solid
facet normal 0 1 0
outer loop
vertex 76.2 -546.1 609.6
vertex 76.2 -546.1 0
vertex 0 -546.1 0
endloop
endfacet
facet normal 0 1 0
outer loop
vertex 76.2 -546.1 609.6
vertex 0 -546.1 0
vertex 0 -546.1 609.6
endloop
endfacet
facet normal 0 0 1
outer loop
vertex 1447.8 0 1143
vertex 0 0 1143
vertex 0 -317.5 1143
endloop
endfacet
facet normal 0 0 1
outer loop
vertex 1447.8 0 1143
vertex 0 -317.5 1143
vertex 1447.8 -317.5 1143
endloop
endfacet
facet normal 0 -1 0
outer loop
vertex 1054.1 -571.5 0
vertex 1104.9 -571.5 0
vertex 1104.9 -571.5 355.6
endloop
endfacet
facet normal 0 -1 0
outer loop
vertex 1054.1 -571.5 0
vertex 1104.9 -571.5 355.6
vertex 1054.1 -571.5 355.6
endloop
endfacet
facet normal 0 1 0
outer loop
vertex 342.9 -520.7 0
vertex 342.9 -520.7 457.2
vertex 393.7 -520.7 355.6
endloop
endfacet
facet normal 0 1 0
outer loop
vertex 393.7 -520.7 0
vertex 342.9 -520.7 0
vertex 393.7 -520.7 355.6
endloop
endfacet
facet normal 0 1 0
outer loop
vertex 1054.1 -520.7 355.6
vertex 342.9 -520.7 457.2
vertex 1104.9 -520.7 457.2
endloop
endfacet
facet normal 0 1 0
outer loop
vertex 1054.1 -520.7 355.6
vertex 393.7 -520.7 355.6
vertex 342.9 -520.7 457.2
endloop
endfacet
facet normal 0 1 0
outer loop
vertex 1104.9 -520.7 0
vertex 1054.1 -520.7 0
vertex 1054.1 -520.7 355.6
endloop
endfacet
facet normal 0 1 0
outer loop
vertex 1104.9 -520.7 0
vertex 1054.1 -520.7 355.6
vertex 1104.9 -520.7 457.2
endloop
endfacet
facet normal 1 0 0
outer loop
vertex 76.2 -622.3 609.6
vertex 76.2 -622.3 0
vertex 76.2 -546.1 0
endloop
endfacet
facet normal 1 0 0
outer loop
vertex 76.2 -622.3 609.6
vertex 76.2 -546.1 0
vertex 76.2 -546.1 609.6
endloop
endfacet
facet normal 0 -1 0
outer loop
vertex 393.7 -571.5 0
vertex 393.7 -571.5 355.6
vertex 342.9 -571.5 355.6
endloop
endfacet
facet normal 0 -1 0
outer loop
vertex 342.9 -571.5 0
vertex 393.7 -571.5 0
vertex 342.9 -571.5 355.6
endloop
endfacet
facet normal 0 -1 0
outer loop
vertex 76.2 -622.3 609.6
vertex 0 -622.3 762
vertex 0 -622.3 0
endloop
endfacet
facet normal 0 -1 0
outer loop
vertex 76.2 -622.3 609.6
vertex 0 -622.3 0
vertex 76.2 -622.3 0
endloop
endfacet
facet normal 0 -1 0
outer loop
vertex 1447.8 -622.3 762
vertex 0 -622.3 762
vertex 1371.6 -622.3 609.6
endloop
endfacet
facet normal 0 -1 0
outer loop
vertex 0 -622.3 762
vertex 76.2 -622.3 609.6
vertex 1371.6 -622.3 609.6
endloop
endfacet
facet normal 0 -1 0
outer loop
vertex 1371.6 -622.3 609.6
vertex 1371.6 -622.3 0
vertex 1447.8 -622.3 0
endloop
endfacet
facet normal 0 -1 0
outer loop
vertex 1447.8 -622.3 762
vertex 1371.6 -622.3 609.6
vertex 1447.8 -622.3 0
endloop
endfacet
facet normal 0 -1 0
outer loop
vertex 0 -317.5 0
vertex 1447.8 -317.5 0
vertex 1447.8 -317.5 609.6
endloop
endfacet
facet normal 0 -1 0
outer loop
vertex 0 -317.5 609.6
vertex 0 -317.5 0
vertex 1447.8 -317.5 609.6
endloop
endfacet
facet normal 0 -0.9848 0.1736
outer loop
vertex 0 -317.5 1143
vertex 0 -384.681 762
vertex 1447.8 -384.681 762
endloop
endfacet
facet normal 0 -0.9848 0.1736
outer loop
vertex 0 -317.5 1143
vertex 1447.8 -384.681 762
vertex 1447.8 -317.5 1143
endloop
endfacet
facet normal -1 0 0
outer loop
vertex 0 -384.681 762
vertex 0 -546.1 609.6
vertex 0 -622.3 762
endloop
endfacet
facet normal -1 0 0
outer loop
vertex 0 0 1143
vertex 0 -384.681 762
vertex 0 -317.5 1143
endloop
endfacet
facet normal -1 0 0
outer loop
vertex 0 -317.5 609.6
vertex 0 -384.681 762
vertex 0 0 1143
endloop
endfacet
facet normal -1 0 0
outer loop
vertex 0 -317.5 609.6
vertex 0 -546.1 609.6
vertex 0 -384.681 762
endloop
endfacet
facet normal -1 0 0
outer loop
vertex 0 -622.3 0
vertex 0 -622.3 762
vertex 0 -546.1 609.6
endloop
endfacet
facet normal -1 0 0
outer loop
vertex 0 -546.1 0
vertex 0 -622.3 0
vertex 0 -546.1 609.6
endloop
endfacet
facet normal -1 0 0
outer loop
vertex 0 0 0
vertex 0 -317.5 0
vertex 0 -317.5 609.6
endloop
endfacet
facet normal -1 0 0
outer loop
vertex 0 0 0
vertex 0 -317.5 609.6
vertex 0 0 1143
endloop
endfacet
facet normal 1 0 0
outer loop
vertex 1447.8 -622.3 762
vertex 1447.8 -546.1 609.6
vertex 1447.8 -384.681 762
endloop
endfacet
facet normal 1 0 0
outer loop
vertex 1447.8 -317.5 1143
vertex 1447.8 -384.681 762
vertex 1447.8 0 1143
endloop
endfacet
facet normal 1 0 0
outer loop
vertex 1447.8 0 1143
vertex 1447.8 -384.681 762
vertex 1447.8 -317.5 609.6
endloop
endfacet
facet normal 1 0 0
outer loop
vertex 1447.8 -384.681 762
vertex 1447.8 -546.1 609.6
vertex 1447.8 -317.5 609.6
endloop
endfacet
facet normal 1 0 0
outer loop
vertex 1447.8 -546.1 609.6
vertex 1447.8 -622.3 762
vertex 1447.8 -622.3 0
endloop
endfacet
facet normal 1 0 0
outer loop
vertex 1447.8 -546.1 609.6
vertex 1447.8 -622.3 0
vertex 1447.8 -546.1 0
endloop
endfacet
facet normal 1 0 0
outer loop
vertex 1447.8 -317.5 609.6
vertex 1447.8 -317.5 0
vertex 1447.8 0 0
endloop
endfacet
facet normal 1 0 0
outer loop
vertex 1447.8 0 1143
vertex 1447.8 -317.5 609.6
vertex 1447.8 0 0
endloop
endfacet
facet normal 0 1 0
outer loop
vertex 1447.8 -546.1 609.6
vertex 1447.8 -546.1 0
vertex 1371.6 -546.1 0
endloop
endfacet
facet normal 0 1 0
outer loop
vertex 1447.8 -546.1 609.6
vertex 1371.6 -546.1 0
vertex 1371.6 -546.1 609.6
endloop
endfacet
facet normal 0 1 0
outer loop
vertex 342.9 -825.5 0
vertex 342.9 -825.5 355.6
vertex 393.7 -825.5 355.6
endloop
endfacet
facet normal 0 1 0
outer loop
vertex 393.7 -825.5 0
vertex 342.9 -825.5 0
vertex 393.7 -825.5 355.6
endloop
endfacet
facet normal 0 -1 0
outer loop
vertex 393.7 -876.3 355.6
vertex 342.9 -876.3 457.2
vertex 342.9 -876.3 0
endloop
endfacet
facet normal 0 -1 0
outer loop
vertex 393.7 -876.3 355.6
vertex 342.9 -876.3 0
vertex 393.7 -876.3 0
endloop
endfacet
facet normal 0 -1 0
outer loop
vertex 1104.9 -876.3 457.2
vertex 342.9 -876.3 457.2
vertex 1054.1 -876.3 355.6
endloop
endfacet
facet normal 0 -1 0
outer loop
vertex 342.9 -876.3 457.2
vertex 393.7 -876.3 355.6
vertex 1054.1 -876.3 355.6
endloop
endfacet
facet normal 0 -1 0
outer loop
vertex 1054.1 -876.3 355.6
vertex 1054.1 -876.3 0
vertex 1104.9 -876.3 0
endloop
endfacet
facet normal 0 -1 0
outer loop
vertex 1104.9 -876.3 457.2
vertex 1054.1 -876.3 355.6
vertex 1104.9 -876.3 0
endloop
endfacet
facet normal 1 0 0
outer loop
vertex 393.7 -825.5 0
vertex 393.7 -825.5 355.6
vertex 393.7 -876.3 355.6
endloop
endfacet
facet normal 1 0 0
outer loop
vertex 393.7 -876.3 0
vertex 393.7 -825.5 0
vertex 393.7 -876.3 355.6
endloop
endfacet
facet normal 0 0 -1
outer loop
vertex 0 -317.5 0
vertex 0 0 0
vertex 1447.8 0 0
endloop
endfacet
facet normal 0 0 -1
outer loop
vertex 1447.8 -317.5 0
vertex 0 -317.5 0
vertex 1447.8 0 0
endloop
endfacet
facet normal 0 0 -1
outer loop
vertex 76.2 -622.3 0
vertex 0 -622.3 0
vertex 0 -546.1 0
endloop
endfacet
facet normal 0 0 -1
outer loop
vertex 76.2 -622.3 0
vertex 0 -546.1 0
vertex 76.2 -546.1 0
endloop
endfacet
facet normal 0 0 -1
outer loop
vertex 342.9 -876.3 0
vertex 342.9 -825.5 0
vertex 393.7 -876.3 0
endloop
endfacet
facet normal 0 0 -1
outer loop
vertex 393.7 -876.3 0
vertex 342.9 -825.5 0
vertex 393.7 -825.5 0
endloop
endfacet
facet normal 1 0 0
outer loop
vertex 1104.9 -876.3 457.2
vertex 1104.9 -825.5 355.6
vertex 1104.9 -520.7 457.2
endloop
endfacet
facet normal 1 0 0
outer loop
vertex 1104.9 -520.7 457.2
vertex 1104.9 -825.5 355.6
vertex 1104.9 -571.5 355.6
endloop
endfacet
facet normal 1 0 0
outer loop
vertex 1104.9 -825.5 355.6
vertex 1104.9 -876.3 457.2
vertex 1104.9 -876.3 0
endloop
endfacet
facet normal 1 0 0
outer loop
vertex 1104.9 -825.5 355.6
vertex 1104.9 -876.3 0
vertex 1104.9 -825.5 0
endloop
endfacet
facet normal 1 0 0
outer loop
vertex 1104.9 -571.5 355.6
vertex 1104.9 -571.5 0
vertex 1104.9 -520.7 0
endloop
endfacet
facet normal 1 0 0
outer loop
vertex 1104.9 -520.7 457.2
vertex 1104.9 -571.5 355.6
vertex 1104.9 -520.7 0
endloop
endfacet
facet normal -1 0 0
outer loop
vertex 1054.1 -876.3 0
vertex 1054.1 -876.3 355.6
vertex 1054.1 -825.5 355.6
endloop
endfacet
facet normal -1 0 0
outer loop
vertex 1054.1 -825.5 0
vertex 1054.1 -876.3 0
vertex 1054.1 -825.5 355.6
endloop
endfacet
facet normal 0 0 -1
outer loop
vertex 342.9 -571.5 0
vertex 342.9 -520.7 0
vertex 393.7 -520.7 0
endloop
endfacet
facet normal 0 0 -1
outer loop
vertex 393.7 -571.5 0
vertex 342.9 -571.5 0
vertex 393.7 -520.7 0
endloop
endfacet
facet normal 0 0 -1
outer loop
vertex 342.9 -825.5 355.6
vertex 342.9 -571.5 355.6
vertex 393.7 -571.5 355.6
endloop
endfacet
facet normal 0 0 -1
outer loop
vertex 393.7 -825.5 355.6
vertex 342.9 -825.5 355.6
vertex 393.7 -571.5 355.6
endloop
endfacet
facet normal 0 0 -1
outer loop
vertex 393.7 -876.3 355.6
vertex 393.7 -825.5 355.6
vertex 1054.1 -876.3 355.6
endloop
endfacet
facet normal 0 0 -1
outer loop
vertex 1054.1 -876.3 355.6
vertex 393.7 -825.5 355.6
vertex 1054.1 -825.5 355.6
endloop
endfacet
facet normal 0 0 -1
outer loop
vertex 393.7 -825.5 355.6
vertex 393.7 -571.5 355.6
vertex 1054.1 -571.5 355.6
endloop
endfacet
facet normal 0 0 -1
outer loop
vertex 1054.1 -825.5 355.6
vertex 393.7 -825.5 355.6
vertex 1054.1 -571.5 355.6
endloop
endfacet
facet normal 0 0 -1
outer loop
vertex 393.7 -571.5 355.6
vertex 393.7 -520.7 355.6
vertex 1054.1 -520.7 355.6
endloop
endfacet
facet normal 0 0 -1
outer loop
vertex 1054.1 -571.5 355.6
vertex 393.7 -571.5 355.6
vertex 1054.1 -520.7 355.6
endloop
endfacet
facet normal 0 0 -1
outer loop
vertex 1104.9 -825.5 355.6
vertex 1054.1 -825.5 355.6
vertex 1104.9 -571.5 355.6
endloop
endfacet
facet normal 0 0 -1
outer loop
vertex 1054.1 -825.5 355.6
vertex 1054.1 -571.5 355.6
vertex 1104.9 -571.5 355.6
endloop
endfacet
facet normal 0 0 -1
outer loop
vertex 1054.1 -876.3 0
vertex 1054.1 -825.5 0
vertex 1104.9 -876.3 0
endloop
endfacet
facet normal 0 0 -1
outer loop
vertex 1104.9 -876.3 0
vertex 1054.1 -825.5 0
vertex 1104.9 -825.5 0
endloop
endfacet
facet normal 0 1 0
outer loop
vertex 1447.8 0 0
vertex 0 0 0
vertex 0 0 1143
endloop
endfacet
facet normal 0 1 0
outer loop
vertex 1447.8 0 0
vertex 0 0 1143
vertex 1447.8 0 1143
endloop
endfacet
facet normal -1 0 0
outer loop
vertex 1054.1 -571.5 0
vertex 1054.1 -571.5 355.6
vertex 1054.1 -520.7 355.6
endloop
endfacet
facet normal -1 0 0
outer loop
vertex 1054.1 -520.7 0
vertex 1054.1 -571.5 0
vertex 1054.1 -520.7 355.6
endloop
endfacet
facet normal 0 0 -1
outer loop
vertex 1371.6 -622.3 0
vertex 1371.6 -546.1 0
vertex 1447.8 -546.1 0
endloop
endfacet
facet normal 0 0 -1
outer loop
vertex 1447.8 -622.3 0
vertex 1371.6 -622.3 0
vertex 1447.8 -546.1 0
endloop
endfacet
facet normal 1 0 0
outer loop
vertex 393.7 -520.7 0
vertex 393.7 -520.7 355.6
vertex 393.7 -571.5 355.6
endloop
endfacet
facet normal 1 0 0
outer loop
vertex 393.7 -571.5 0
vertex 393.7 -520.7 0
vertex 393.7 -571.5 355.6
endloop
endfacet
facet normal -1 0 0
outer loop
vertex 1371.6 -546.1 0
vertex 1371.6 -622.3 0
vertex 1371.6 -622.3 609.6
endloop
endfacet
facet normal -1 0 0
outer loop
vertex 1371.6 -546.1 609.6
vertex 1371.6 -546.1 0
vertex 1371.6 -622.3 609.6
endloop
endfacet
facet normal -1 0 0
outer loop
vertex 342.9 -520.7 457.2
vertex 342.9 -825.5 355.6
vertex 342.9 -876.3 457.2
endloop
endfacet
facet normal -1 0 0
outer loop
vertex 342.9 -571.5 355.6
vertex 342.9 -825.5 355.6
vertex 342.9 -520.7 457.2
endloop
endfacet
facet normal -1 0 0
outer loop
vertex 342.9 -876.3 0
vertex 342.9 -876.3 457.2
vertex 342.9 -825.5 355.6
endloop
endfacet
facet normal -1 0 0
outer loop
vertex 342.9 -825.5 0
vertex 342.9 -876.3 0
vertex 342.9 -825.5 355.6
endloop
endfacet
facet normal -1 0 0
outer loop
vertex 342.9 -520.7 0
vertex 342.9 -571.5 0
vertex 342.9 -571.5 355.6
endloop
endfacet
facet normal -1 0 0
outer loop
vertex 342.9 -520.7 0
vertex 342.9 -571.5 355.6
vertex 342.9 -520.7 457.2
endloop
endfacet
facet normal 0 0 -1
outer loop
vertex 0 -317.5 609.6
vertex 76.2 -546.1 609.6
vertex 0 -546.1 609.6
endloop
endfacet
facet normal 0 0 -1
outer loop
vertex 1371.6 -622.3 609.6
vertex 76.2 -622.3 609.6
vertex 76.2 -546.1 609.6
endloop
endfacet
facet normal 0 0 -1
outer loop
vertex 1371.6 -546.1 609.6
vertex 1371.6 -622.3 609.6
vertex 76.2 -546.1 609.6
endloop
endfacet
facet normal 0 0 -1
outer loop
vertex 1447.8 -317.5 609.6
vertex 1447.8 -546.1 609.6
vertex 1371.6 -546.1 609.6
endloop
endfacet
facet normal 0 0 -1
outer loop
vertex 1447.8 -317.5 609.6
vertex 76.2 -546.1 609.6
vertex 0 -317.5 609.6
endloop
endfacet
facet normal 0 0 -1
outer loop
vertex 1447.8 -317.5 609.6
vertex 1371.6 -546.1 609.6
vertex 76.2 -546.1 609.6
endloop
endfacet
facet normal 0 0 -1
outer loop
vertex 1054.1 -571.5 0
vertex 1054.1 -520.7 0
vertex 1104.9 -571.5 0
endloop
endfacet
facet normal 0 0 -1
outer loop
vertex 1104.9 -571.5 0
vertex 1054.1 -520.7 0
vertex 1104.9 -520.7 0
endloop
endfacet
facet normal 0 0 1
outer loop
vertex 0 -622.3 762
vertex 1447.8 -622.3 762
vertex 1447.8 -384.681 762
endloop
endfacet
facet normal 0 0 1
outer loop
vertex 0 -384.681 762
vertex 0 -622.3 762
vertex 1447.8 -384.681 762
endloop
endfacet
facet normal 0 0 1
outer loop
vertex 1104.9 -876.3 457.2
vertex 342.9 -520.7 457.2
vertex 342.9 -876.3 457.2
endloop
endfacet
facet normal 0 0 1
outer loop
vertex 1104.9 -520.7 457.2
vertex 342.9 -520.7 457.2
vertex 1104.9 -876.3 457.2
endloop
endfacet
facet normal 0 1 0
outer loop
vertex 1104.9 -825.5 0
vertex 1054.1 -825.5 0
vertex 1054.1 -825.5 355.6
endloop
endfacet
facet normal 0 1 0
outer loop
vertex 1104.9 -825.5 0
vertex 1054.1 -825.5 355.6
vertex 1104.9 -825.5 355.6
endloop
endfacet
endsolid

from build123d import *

# Parameters (mm, degrees)
F0_W      = 1447.8
F0_H      = 622.3
F1_DEPTH  = 1143
F3_DEPTH  = 1447.801
F4_W      = 1295.4
F4_H      = 609.6
F5_DEPTH  = 304.8
F6_W      = 228.6
F6_H      = 609.6
F7_DEPTH  = 1447.801
F8_W      = 762
F8_H      = 355.6
F10_DEPTH = 457.2
F11_DEPTH = 355.6


with BuildPart() as f1:
    # F0 (on Top) → F1 (new body)
    with BuildSketch(Plane.XY):
        with Locations((723.9, -311.15)):
            Rectangle(F0_W, F0_H)
    extrude(amount=F1_DEPTH)

    # F2 (on face) → F3 (cut, through all)
    with BuildSketch(Plane.YZ.offset(1447.8)):
        Polygon((-317.5, 1143), (-622.3, 1143), (-622.3, 762), (-384.68058, 762), align=None)
    extrude(amount=-F3_DEPTH, mode=Mode.SUBTRACT)

    # F4 (on face) → F5 (cut)
    with BuildSketch(Plane.XZ.offset(622.3)):
        with Locations((723.9, 304.8)):
            Rectangle(F4_W, F4_H)
    extrude(amount=-F5_DEPTH, mode=Mode.SUBTRACT)

    # F6 (on face) → F7 (cut, through all)
    with BuildSketch(Plane.YZ.offset(1447.8)):
        with Locations((-431.8, 304.8)):
            Rectangle(F6_W, F6_H)
    extrude(amount=-F7_DEPTH, mode=Mode.SUBTRACT)


with BuildPart() as f10:
    # F8 (on Top) → F10 (new body)
    with BuildSketch(Plane.XY):
        with Locations((723.9, -698.5)):
            Rectangle(F8_W, F8_H)
    extrude(amount=F10_DEPTH)

    # F9 (on Top) → F11 (cut)
    with BuildSketch(Plane.XY):
        Polygon((342.9, -571.5), (342.9, -825.5), (393.7, -825.5), (393.7, -876.3), (1054.1, -876.3), (1054.1, -825.5), (1104.9, -825.5), (1104.9, -571.5), (1054.1, -571.5), (1054.1, -520.7), (393.7, -520.7), (393.7, -571.5), align=None)
    extrude(amount=F11_DEPTH, mode=Mode.SUBTRACT)


solid = Compound([f1.part, f10.part])
